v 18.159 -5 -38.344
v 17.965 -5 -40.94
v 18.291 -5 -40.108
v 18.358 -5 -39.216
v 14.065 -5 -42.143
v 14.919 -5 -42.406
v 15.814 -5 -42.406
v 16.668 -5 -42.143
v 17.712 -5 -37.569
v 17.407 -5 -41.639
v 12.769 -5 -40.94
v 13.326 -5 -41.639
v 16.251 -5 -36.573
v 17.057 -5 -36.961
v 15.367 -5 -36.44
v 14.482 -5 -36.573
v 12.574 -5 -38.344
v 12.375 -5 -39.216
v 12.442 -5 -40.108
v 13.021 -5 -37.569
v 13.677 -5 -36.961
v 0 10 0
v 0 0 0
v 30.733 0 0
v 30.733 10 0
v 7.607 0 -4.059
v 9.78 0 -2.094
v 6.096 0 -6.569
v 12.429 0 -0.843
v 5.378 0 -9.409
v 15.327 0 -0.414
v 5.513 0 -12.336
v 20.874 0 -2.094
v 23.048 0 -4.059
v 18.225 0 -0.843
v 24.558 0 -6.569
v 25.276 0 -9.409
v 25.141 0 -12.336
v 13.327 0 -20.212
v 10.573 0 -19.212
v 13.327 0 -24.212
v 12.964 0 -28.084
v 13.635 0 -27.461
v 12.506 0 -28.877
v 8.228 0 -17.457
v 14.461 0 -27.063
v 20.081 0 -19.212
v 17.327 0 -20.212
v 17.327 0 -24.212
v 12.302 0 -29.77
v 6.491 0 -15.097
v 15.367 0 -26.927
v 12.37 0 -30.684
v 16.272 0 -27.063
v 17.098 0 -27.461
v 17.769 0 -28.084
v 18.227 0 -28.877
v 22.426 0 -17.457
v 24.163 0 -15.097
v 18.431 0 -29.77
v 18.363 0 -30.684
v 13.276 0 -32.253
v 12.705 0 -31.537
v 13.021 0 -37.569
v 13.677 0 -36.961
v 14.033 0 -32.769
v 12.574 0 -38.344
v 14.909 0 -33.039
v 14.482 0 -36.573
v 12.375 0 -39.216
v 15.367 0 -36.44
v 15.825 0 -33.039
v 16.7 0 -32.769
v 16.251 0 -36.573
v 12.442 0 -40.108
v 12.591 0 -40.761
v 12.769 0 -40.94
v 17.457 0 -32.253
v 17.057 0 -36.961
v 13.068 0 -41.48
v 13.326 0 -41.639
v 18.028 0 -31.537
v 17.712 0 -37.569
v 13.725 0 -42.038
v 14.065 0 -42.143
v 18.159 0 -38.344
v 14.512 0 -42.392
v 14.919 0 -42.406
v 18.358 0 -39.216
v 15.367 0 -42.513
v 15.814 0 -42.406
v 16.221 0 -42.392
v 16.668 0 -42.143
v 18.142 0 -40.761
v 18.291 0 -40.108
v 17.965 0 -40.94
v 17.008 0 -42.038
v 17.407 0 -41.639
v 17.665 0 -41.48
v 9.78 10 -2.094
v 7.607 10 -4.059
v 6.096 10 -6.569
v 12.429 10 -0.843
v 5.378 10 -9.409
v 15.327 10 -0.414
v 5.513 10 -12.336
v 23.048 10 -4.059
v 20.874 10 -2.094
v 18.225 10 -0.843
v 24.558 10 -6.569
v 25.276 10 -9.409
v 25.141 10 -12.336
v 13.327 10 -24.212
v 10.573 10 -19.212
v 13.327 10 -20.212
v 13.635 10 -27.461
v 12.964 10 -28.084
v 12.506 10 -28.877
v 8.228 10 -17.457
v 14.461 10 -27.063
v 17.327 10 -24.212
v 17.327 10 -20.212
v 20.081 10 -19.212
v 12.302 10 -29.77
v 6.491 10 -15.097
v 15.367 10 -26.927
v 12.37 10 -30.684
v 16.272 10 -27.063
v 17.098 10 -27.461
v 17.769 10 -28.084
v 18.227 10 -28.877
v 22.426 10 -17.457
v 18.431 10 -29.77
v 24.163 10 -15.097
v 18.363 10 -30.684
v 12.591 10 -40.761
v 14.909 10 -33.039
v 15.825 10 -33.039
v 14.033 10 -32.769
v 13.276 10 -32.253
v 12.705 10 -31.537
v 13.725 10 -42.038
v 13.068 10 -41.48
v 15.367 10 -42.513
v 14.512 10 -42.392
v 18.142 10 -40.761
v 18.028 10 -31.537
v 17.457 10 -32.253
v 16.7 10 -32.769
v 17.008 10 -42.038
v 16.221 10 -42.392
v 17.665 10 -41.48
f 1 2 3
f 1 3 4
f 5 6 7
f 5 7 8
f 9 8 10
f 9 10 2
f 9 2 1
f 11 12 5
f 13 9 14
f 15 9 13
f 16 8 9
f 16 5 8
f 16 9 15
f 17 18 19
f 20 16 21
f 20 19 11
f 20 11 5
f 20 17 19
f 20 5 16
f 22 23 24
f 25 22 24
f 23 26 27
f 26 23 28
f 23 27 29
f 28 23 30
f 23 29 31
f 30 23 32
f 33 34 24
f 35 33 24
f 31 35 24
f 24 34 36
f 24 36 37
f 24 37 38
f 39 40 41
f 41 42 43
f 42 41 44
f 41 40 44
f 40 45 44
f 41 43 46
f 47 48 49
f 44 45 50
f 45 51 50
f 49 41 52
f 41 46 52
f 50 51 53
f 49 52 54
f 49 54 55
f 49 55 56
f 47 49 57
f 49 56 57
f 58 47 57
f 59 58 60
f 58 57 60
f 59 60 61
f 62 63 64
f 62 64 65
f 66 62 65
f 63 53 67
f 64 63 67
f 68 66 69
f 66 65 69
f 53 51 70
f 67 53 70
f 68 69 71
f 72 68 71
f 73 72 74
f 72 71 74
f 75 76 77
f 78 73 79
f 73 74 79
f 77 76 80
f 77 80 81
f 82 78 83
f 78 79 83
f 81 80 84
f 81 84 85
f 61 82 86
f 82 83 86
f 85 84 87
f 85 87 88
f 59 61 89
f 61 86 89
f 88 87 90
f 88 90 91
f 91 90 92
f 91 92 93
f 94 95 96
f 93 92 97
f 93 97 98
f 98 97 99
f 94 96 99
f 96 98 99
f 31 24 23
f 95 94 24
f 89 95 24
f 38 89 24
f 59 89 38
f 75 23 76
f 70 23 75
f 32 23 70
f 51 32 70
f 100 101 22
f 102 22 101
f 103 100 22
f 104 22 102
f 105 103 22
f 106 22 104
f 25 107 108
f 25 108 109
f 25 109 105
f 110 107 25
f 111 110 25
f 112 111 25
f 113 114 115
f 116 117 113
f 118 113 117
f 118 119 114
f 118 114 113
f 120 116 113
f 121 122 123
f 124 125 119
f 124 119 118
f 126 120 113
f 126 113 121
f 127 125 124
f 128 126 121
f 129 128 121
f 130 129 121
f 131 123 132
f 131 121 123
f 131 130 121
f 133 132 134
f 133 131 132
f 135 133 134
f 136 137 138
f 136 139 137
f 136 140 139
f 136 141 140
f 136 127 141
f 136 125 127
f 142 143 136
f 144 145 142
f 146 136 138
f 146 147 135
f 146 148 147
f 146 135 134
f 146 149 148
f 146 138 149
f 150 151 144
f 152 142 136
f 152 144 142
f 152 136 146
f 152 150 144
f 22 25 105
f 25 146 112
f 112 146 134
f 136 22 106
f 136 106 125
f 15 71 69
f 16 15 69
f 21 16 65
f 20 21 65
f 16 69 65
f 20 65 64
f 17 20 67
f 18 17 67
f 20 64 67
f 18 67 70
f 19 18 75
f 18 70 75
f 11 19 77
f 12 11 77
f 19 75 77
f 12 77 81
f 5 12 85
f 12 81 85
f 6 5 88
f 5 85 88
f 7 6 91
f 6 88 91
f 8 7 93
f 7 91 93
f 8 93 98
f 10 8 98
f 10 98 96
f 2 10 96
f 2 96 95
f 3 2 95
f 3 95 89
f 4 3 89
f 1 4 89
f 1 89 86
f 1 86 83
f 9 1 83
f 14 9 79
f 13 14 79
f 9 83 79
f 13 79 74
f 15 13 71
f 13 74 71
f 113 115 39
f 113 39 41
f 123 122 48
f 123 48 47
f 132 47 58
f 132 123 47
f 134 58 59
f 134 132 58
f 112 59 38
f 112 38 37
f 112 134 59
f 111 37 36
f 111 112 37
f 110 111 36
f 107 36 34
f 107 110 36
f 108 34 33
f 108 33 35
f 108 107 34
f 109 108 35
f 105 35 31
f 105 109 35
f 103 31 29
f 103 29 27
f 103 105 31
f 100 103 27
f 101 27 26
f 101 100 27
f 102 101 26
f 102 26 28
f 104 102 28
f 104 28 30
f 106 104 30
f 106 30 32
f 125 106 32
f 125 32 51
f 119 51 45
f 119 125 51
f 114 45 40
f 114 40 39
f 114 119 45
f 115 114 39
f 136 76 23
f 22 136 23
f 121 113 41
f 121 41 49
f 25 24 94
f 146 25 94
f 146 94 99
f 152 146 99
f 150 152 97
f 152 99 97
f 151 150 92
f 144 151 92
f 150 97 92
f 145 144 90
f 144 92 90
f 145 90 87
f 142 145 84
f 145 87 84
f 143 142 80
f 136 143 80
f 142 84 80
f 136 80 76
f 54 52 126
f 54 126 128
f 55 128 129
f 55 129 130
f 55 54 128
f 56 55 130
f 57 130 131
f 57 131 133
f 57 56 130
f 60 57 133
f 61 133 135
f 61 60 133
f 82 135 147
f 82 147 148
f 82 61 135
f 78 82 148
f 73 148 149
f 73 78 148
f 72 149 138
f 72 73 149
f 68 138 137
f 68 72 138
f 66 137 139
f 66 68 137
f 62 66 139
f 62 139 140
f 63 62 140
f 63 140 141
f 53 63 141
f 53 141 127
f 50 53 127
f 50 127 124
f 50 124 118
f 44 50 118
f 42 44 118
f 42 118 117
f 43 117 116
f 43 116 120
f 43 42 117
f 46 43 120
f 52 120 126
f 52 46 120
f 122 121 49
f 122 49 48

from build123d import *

# Parameters (mm, degrees)
SKETCH_1_R          = 3.073322802
EXTRUDE_1_DEPTH     = 10
SKETCH_2_R          = 3
EXTRUDE_2_DEPTH     = 5
CUT_EXTRUDE_1_DEPTH = 10


with BuildPart() as part:
    # 草图1 → 凸台-拉伸1 (new body)
    with BuildSketch(Plane(origin=(0, 0, 0), x_dir=(1, 0, 0), z_dir=(0, 1, 0))):
        with BuildLine():
            Line((0, 0), (30.73322802, 0))
            Line((30.73322802, 0), (18.141743603, 40.76055825))
            ThreePointArc((18.141743603, 40.76055825), (15.36661401, 42.513286949), (12.591484417, 40.76055825))
            Line((12.591484417, 40.76055825), (0, 0))
        make_face()
        with Locations(Location((15.36661401, 30, 0), (0, 0, 270))):
            Circle(SKETCH_1_R, mode=Mode.SUBTRACT)
    extrude(amount=EXTRUDE_1_DEPTH)

    # 草图2 → 凸台-拉伸2 (add)
    with BuildSketch(Plane.XZ):
        with Locations(Location((15.36661401, -39.439964147, 0), (0, 0, 90))):
            Circle(SKETCH_2_R)
    extrude(amount=EXTRUDE_2_DEPTH)

    # 草图3 → 切除-拉伸1 (cut)
    with BuildSketch(Plane(origin=(0, 10, 0), x_dir=(1, 0, 0), z_dir=(0, 1, 0))):
        with BuildLine():
            Line((13.327100422, 20.21204175), (13.327100422, 24.21204175))
            Line((13.327100422, 24.21204175), (17.327100422, 24.21204175))
            Line((17.327100422, 24.21204175), (17.327100422, 20.21204175))
            ThreePointArc((17.327100422, 20.21204175), (15.327100422, 0.414082779), (13.327100422, 20.21204175))
        make_face()
    extrude(amount=-CUT_EXTRUDE_1_DEPTH, mode=Mode.SUBTRACT)


solid = part.part
